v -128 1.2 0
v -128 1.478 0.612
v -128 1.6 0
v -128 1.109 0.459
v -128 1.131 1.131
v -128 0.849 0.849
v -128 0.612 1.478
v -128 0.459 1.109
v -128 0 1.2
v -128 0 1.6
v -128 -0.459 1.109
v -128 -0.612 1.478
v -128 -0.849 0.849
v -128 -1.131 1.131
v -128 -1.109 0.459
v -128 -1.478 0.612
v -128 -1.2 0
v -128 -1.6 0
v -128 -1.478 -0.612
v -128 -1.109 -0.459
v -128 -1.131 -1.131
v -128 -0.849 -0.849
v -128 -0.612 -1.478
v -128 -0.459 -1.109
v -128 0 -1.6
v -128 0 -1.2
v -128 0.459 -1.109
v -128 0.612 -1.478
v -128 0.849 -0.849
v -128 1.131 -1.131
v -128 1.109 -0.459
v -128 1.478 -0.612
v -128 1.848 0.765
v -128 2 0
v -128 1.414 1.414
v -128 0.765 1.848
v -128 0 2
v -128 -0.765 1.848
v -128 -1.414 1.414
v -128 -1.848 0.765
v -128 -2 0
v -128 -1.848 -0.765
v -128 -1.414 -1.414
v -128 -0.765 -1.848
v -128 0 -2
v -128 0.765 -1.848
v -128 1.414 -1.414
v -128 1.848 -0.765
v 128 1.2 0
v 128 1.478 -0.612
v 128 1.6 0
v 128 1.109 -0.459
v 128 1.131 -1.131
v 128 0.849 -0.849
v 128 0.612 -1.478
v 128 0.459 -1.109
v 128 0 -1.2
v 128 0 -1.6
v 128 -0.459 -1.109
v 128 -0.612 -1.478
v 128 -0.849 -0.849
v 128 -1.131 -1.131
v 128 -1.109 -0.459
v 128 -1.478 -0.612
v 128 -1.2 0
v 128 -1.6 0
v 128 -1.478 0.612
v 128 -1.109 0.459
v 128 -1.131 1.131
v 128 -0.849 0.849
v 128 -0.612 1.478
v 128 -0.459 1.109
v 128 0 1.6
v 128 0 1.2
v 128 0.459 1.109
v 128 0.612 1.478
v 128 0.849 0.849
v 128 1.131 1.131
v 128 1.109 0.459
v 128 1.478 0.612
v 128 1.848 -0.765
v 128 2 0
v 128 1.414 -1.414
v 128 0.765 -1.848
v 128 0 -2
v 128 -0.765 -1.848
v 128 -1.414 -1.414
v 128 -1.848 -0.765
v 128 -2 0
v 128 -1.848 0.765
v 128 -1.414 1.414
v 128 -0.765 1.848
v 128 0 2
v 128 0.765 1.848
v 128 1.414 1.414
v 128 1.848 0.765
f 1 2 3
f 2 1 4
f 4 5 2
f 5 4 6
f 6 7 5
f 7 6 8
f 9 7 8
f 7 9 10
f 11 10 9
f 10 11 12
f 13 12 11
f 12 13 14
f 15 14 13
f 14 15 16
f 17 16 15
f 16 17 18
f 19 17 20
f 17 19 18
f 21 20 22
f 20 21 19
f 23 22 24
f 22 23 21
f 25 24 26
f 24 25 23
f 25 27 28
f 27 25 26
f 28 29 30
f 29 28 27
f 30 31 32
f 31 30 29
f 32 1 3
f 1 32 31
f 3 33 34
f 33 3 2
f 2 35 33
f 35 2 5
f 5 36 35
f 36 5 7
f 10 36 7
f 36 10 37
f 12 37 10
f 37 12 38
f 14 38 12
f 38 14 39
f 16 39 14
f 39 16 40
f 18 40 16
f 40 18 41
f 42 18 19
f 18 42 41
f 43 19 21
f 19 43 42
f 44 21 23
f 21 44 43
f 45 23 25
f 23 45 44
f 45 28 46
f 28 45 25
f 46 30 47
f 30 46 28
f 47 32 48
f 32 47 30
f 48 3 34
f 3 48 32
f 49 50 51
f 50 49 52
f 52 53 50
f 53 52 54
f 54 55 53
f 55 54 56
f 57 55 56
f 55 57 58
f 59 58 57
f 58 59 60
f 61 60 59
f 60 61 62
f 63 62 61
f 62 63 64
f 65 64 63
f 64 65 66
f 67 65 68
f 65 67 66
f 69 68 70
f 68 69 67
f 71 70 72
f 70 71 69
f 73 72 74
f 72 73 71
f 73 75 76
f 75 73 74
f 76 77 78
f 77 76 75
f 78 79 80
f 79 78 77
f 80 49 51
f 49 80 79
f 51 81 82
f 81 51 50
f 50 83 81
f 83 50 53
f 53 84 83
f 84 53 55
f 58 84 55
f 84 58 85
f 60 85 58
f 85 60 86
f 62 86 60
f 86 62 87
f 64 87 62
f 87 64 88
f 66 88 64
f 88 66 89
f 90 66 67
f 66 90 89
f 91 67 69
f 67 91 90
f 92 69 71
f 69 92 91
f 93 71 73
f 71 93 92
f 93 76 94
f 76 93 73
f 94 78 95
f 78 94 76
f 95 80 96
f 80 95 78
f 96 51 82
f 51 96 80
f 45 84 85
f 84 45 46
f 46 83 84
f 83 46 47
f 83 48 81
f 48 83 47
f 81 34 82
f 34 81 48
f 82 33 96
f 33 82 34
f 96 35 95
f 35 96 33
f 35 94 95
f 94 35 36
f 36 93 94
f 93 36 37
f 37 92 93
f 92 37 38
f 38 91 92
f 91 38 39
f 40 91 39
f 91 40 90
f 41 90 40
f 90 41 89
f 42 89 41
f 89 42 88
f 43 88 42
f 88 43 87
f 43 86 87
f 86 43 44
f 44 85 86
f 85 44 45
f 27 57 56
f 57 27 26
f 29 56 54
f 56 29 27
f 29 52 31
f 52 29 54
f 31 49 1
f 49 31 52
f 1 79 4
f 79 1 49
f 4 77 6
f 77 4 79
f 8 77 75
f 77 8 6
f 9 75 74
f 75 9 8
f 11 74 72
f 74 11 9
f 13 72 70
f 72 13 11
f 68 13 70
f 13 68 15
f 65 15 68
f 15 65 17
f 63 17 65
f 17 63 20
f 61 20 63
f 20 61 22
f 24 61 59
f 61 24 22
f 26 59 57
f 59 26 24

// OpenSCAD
// file: ../p/4-4cyli.scad
use <../lib.scad>
function ldraw_lib__4_4cyli() = [
// 0 Cylinder 1.0
// 0 Name: 4-4cyli.dat
// 0 Author: James Jessiman
// 0 !LDRAW_ORG Primitive UPDATE 2005-01
// 0 !LICENSE Licensed under CC BY 2.0 and CC BY 4.0 : see CAreadme.txt
// 
// 0 BFC CERTIFY CCW
  [0,"BFC","CERTIFY"],
  [0,"BFC","CCW"],
// 
// 0 !HISTORY 1998-12-15 [PTadmin] Official Update 1998-10
// 0 !HISTORY 2002-03-23 [sbliss] Added BFC statement; merged headers from files in distributions LDraw 0.27 and Complete.
// 0 !HISTORY 2002-04-25 [PTadmin] Official Update 2002-02
// 0 !HISTORY 2004-12-14 [guyvivan] BFC CCW
// 0 !HISTORY 2005-12-28 [PTadmin] Official Update 2005-01
// 0 !HISTORY 2007-06-24 [PTadmin] Header formatted for Contributor Agreement
// 0 !HISTORY 2008-07-01 [PTadmin] Official Update 2008-01
// 
// 
// 4 16 1 1 0 0.9239 1 0.3827 0.9239 0 0.3827 1 0 0
  [4,16,1,1,0,0.9239,1,0.3827,0.9239,0,0.3827,1,0,0],
// 5 24 1 0 0 1 1 0 0.9239 0 0.3827 0.9239 0 -0.3827
  [5,24,1,0,0,1,1,0,0.9239,0,0.3827,0.9239,0,-0.3827],
// 4 16 0.9239 1 0.3827 0.7071 1 0.7071 0.7071 0 0.7071 0.9239 0 0.3827
  [4,16,0.9239,1,0.3827,0.7071,1,0.7071,0.7071,0,0.7071,0.9239,0,0.3827],
// 5 24 0.9239 0 0.3827 0.9239 1 0.3827 0.7071 0 0.7071 1 0 0
  [5,24,0.9239,0,0.3827,0.9239,1,0.3827,0.7071,0,0.7071,1,0,0],
// 4 16 0.7071 1 0.7071 0.3827 1 0.9239 0.3827 0 0.9239 0.7071 0 0.7071
  [4,16,0.7071,1,0.7071,0.3827,1,0.9239,0.3827,0,0.9239,0.7071,0,0.7071],
// 5 24 0.7071 0 0.7071 0.7071 1 0.7071 0.3827 0 0.9239 0.9239 0 0.3827
  [5,24,0.7071,0,0.7071,0.7071,1,0.7071,0.3827,0,0.9239,0.9239,0,0.3827],
// 4 16 0.3827 1 0.9239 0 1 1 0 0 1 0.3827 0 0.9239
  [4,16,0.3827,1,0.9239,0,1,1,0,0,1,0.3827,0,0.9239],
// 5 24 0.3827 0 0.9239 0.3827 1 0.9239 0 0 1 0.7071 0 0.7071
  [5,24,0.3827,0,0.9239,0.3827,1,0.9239,0,0,1,0.7071,0,0.7071],
// 4 16 0 1 1 -0.3827 1 0.9239 -0.3827 0 0.9239 0 0 1
  [4,16,0,1,1,-0.3827,1,0.9239,-0.3827,0,0.9239,0,0,1],
// 5 24 0 0 1 0 1 1 -0.3827 0 0.9239 0.3827 0 0.9239
  [5,24,0,0,1,0,1,1,-0.3827,0,0.9239,0.3827,0,0.9239],
// 4 16 -0.3827 1 0.9239 -0.7071 1 0.7071 -0.7071 0 0.7071 -0.3827 0 0.9239
  [4,16,-0.3827,1,0.9239,-0.7071,1,0.7071,-0.7071,0,0.7071,-0.3827,0,0.9239],
// 5 24 -0.3827 0 0.9239 -0.3827 1 0.9239 -0.7071 0 0.7071 0 0 1
  [5,24,-0.3827,0,0.9239,-0.3827,1,0.9239,-0.7071,0,0.7071,0,0,1],
// 4 16 -0.7071 1 0.7071 -0.9239 1 0.3827 -0.9239 0 0.3827 -0.7071 0 0.7071
  [4,16,-0.7071,1,0.7071,-0.9239,1,0.3827,-0.9239,0,0.3827,-0.7071,0,0.7071],
// 5 24 -0.7071 0 0.7071 -0.7071 1 0.7071 -0.9239 0 0.3827 -0.3827 0 0.9239
  [5,24,-0.7071,0,0.7071,-0.7071,1,0.7071,-0.9239,0,0.3827,-0.3827,0,0.9239],
// 4 16 -0.9239 1 0.3827 -1 1 0 -1 0 0 -0.9239 0 0.3827
  [4,16,-0.9239,1,0.3827,-1,1,0,-1,0,0,-0.9239,0,0.3827],
// 5 24 -0.9239 0 0.3827 -0.9239 1 0.3827 -1 0 0 -0.7071 0 0.7071
  [5,24,-0.9239,0,0.3827,-0.9239,1,0.3827,-1,0,0,-0.7071,0,0.7071],
// 4 16 -1 1 0 -0.9239 1 -0.3827 -0.9239 0 -0.3827 -1 0 0
  [4,16,-1,1,0,-0.9239,1,-0.3827,-0.9239,0,-0.3827,-1,0,0],
// 5 24 -1 0 0 -1 1 0 -0.9239 0 -0.3827 -0.9239 0 0.3827
  [5,24,-1,0,0,-1,1,0,-0.9239,0,-0.3827,-0.9239,0,0.3827],
// 4 16 -0.9239 1 -0.3827 -0.7071 1 -0.7071 -0.7071 0 -0.7071 -0.9239 0 -0.3827
  [4,16,-0.9239,1,-0.3827,-0.7071,1,-0.7071,-0.7071,0,-0.7071,-0.9239,0,-0.3827],
// 5 24 -0.9239 0 -0.3827 -0.9239 1 -0.3827 -0.7071 0 -0.7071 -1 0 0
  [5,24,-0.9239,0,-0.3827,-0.9239,1,-0.3827,-0.7071,0,-0.7071,-1,0,0],
// 4 16 -0.7071 1 -0.7071 -0.3827 1 -0.9239 -0.3827 0 -0.9239 -0.7071 0 -0.7071
  [4,16,-0.7071,1,-0.7071,-0.3827,1,-0.9239,-0.3827,0,-0.9239,-0.7071,0,-0.7071],
// 5 24 -0.7071 0 -0.7071 -0.7071 1 -0.7071 -0.3827 0 -0.9239 -0.9239 0 -0.3827
  [5,24,-0.7071,0,-0.7071,-0.7071,1,-0.7071,-0.3827,0,-0.9239,-0.9239,0,-0.3827],
// 4 16 -0.3827 1 -0.9239 0 1 -1 0 0 -1 -0.3827 0 -0.9239
  [4,16,-0.3827,1,-0.9239,0,1,-1,0,0,-1,-0.3827,0,-0.9239],
// 5 24 -0.3827 0 -0.9239 -0.3827 1 -0.9239 0 0 -1 -0.7071 0 -0.7071
  [5,24,-0.3827,0,-0.9239,-0.3827,1,-0.9239,0,0,-1,-0.7071,0,-0.7071],
// 4 16 0 1 -1 0.3827 1 -0.9239 0.3827 0 -0.9239 0 0 -1
  [4,16,0,1,-1,0.3827,1,-0.9239,0.3827,0,-0.9239,0,0,-1],
// 5 24 0 0 -1 0 1 -1 0.3827 0 -0.9239 -0.3827 0 -0.9239
  [5,24,0,0,-1,0,1,-1,0.3827,0,-0.9239,-0.3827,0,-0.9239],
// 4 16 0.3827 1 -0.9239 0.7071 1 -0.7071 0.7071 0 -0.7071 0.3827 0 -0.9239
  [4,16,0.3827,1,-0.9239,0.7071,1,-0.7071,0.7071,0,-0.7071,0.3827,0,-0.9239],
// 5 24 0.3827 0 -0.9239 0.3827 1 -0.9239 0.7071 0 -0.7071 0 0 -1
  [5,24,0.3827,0,-0.9239,0.3827,1,-0.9239,0.7071,0,-0.7071,0,0,-1],
// 4 16 0.7071 1 -0.7071 0.9239 1 -0.3827 0.9239 0 -0.3827 0.7071 0 -0.7071
  [4,16,0.7071,1,-0.7071,0.9239,1,-0.3827,0.9239,0,-0.3827,0.7071,0,-0.7071],
// 5 24 0.7071 0 -0.7071 0.7071 1 -0.7071 0.9239 0 -0.3827 0.3827 0 -0.9239
  [5,24,0.7071,0,-0.7071,0.7071,1,-0.7071,0.9239,0,-0.3827,0.3827,0,-0.9239],
// 4 16 0.9239 1 -0.3827 1 1 0 1 0 0 0.9239 0 -0.3827
  [4,16,0.9239,1,-0.3827,1,1,0,1,0,0,0.9239,0,-0.3827],
// 5 24 0.9239 0 -0.3827 0.9239 1 -0.3827 1 0 0 0.7071 0 -0.7071
  [5,24,0.9239,0,-0.3827,0.9239,1,-0.3827,1,0,0,0.7071,0,-0.7071],
// 0
];
module ldraw_lib__4_4cyli(step=0, col=false, unit=2/5, alt=false, line=0.2, solid=!$preview)
    makepoly(ldraw_lib__4_4cyli(), step=step, col=col, unit=unit, alt=alt, line=line, solid=solid);
ldraw_lib__4_4cyli(line=0.2);
// file: ../p/4-4ring4.scad
use <../lib.scad>
function ldraw_lib__4_4ring4() = [
// 0 Ring  4 x 1.0
// 0 Name: 4-4ring4.dat
// 0 Author: James Jessiman
// 0 !LDRAW_ORG Primitive UPDATE 2009-01
// 0 !LICENSE Licensed under CC BY 2.0 and CC BY 4.0 : see CAreadme.txt
// 
// 0 BFC CERTIFY CCW
  [0,"BFC","CERTIFY"],
  [0,"BFC","CCW"],
// 
// 0 !HISTORY 1998-12-15 [PTadmin] Official Update 1998-10
// 0 !HISTORY 2002-04-08 [BrickCaster] Modified for BFC compliance
// 0 !HISTORY 2002-04-25 [PTadmin] Official Update 2002-02
// 0 !HISTORY 2007-06-24 [PTadmin] Header formatted for Contributor Agreement
// 0 !HISTORY 2008-07-01 [PTadmin] Official Update 2008-01
// 0 !HISTORY 2008-08-26 [cwdee] Switch polygon winding and rename
// 0 !HISTORY 2009-05-02 [PTadmin] Official Update 2009-01
// 
// 
// 4 16 -1.9135 0 4.6195 -1.5308 0 3.6956 0 0 4 0 0 5
  [4,16,-1.9135,0,4.6195,-1.5308,0,3.6956,0,0,4,0,0,5],
// 4 16 -3.5355 0 3.5355 -2.8284 0 2.8284 -1.5308 0 3.6956 -1.9135 0 4.6195
  [4,16,-3.5355,0,3.5355,-2.8284,0,2.8284,-1.5308,0,3.6956,-1.9135,0,4.6195],
// 4 16 -4.6195 0 1.9135 -3.6956 0 1.5308 -2.8284 0 2.8284 -3.5355 0 3.5355
  [4,16,-4.6195,0,1.9135,-3.6956,0,1.5308,-2.8284,0,2.8284,-3.5355,0,3.5355],
// 4 16 -5 0 0 -4 0 0 -3.6956 0 1.5308 -4.6195 0 1.9135
  [4,16,-5,0,0,-4,0,0,-3.6956,0,1.5308,-4.6195,0,1.9135],
// 4 16 -4.6195 0 -1.9135 -3.6956 0 -1.5308 -4 0 0 -5 0 0
  [4,16,-4.6195,0,-1.9135,-3.6956,0,-1.5308,-4,0,0,-5,0,0],
// 4 16 -3.5355 0 -3.5355 -2.8284 0 -2.8284 -3.6956 0 -1.5308 -4.6195 0 -1.9135
  [4,16,-3.5355,0,-3.5355,-2.8284,0,-2.8284,-3.6956,0,-1.5308,-4.6195,0,-1.9135],
// 4 16 -1.9135 0 -4.6195 -1.5308 0 -3.6956 -2.8284 0 -2.8284 -3.5355 0 -3.5355
  [4,16,-1.9135,0,-4.6195,-1.5308,0,-3.6956,-2.8284,0,-2.8284,-3.5355,0,-3.5355],
// 4 16 0 0 -5 0 0 -4 -1.5308 0 -3.6956 -1.9135 0 -4.6195
  [4,16,0,0,-5,0,0,-4,-1.5308,0,-3.6956,-1.9135,0,-4.6195],
// 4 16 1.9135 0 -4.6195 1.5308 0 -3.6956 0 0 -4 0 0 -5
  [4,16,1.9135,0,-4.6195,1.5308,0,-3.6956,0,0,-4,0,0,-5],
// 4 16 3.5355 0 -3.5355 2.8284 0 -2.8284 1.5308 0 -3.6956 1.9135 0 -4.6195
  [4,16,3.5355,0,-3.5355,2.8284,0,-2.8284,1.5308,0,-3.6956,1.9135,0,-4.6195],
// 4 16 4.6195 0 -1.9135 3.6956 0 -1.5308 2.8284 0 -2.8284 3.5355 0 -3.5355
  [4,16,4.6195,0,-1.9135,3.6956,0,-1.5308,2.8284,0,-2.8284,3.5355,0,-3.5355],
// 4 16 5 0 0 4 0 0 3.6956 0 -1.5308 4.6195 0 -1.9135
  [4,16,5,0,0,4,0,0,3.6956,0,-1.5308,4.6195,0,-1.9135],
// 4 16 4.6195 0 1.9135 3.6956 0 1.5308 4 0 0 5 0 0
  [4,16,4.6195,0,1.9135,3.6956,0,1.5308,4,0,0,5,0,0],
// 4 16 3.5355 0 3.5355 2.8284 0 2.8284 3.6956 0 1.5308 4.6195 0 1.9135
  [4,16,3.5355,0,3.5355,2.8284,0,2.8284,3.6956,0,1.5308,4.6195,0,1.9135],
// 4 16 1.9135 0 4.6195 1.5308 0 3.6956 2.8284 0 2.8284 3.5355 0 3.5355
  [4,16,1.9135,0,4.6195,1.5308,0,3.6956,2.8284,0,2.8284,3.5355,0,3.5355],
// 4 16 0 0 5 0 0 4 1.5308 0 3.6956 1.9135 0 4.6195
  [4,16,0,0,5,0,0,4,1.5308,0,3.6956,1.9135,0,4.6195],
// 0
];
module ldraw_lib__4_4ring4(step=0, col=false, unit=2/5, alt=false, line=0.2, solid=!$preview)
    makepoly(ldraw_lib__4_4ring4(), step=step, col=col, unit=unit, alt=alt, line=line, solid=solid);
ldraw_lib__4_4ring4(line=0.2);
// file: ../p/4-4ring3.scad
use <../lib.scad>
function ldraw_lib__4_4ring3() = [
// 0 Ring  3 x 1.0
// 0 Name: 4-4ring3.dat
// 0 Author: James Jessiman
// 0 !LDRAW_ORG Primitive UPDATE 2009-01
// 0 !LICENSE Licensed under CC BY 2.0 and CC BY 4.0 : see CAreadme.txt
// 
// 0 BFC CERTIFY CCW
  [0,"BFC","CERTIFY"],
  [0,"BFC","CCW"],
// 
// 0 !HISTORY 1998-12-15 [PTadmin] Official Update 1998-10
// 0 !HISTORY 2002-04-05 [hafhead] Added BFC statement
// 0 !HISTORY 2002-04-25 [PTadmin] Official Update 2002-02
// 0 !HISTORY 2007-06-24 [PTadmin] Header formatted for Contributor Agreement
// 0 !HISTORY 2008-07-01 [PTadmin] Official Update 2008-01
// 0 !HISTORY 2008-08-26 [cwdee] Switch polygon winding and rename
// 0 !HISTORY 2009-05-02 [PTadmin] Official Update 2009-01
// 
// 
// 4 16 -1.5308 0 3.6956 -1.1481 0 2.7717 0 0 3 0 0 4
  [4,16,-1.5308,0,3.6956,-1.1481,0,2.7717,0,0,3,0,0,4],
// 4 16 -2.8284 0 2.8284 -2.1213 0 2.1213 -1.1481 0 2.7717 -1.5308 0 3.6956
  [4,16,-2.8284,0,2.8284,-2.1213,0,2.1213,-1.1481,0,2.7717,-1.5308,0,3.6956],
// 4 16 -3.6956 0 1.5308 -2.7717 0 1.1481 -2.1213 0 2.1213 -2.8284 0 2.8284
  [4,16,-3.6956,0,1.5308,-2.7717,0,1.1481,-2.1213,0,2.1213,-2.8284,0,2.8284],
// 4 16 -4 0 0 -3 0 0 -2.7717 0 1.1481 -3.6956 0 1.5308
  [4,16,-4,0,0,-3,0,0,-2.7717,0,1.1481,-3.6956,0,1.5308],
// 4 16 -3.6956 0 -1.5308 -2.7717 0 -1.1481 -3 0 0 -4 0 0
  [4,16,-3.6956,0,-1.5308,-2.7717,0,-1.1481,-3,0,0,-4,0,0],
// 4 16 -2.8284 0 -2.8284 -2.1213 0 -2.1213 -2.7717 0 -1.1481 -3.6956 0 -1.5308
  [4,16,-2.8284,0,-2.8284,-2.1213,0,-2.1213,-2.7717,0,-1.1481,-3.6956,0,-1.5308],
// 4 16 -1.5308 0 -3.6956 -1.1481 0 -2.7717 -2.1213 0 -2.1213 -2.8284 0 -2.8284
  [4,16,-1.5308,0,-3.6956,-1.1481,0,-2.7717,-2.1213,0,-2.1213,-2.8284,0,-2.8284],
// 4 16 0 0 -4 0 0 -3 -1.1481 0 -2.7717 -1.5308 0 -3.6956
  [4,16,0,0,-4,0,0,-3,-1.1481,0,-2.7717,-1.5308,0,-3.6956],
// 4 16 1.5308 0 -3.6956 1.1481 0 -2.7717 0 0 -3 0 0 -4
  [4,16,1.5308,0,-3.6956,1.1481,0,-2.7717,0,0,-3,0,0,-4],
// 4 16 2.8284 0 -2.8284 2.1213 0 -2.1213 1.1481 0 -2.7717 1.5308 0 -3.6956
  [4,16,2.8284,0,-2.8284,2.1213,0,-2.1213,1.1481,0,-2.7717,1.5308,0,-3.6956],
// 4 16 3.6956 0 -1.5308 2.7717 0 -1.1481 2.1213 0 -2.1213 2.8284 0 -2.8284
  [4,16,3.6956,0,-1.5308,2.7717,0,-1.1481,2.1213,0,-2.1213,2.8284,0,-2.8284],
// 4 16 4 0 0 3 0 0 2.7717 0 -1.1481 3.6956 0 -1.5308
  [4,16,4,0,0,3,0,0,2.7717,0,-1.1481,3.6956,0,-1.5308],
// 4 16 3.6956 0 1.5308 2.7717 0 1.1481 3 0 0 4 0 0
  [4,16,3.6956,0,1.5308,2.7717,0,1.1481,3,0,0,4,0,0],
// 4 16 2.8284 0 2.8284 2.1213 0 2.1213 2.7717 0 1.1481 3.6956 0 1.5308
  [4,16,2.8284,0,2.8284,2.1213,0,2.1213,2.7717,0,1.1481,3.6956,0,1.5308],
// 4 16 1.5308 0 3.6956 1.1481 0 2.7717 2.1213 0 2.1213 2.8284 0 2.8284
  [4,16,1.5308,0,3.6956,1.1481,0,2.7717,2.1213,0,2.1213,2.8284,0,2.8284],
// 4 16 0 0 4 0 0 3 1.1481 0 2.7717 1.5308 0 3.6956
  [4,16,0,0,4,0,0,3,1.1481,0,2.7717,1.5308,0,3.6956],
// 0
];
module ldraw_lib__4_4ring3(step=0, col=false, unit=2/5, alt=false, line=0.2, solid=!$preview)
    makepoly(ldraw_lib__4_4ring3(), step=step, col=col, unit=unit, alt=alt, line=line, solid=solid);
ldraw_lib__4_4ring3(line=0.2);
// file: ../p/4-4edge.scad
use <../lib.scad>
function ldraw_lib__4_4edge() = [
// 0 Circle 1.0
// 0 Name: 4-4edge.dat
// 0 Author: James Jessiman
// 0 !LDRAW_ORG Primitive UPDATE 2017-01
// 0 !LICENSE Licensed under CC BY 2.0 and CC BY 4.0 : see CAreadme.txt
// 
// 0 BFC CERTIFY CCW
  [0,"BFC","CERTIFY"],
  [0,"BFC","CCW"],
// 
// 0 !HISTORY 1998-12-15 [PTadmin] Official Update 1998-10
// 0 !HISTORY 2005-12-28 [PTadmin] Official Update 2005-01
// 0 !HISTORY 2007-06-24 [PTadmin] Header formatted for Contributor Agreement
// 0 !HISTORY 2008-07-01 [PTadmin] Official Update 2008-01
// 0 !HISTORY 2017-01-15 [Steffen] BFCed
// 0 !HISTORY 2017-12-30 [PTadmin] Official Update 2017-01
// 
// 
// 2 24 1 0 0 0.9239 0 0.3827
  [2,24,1,0,0,0.9239,0,0.3827],
// 2 24 0.9239 0 0.3827 0.7071 0 0.7071
  [2,24,0.9239,0,0.3827,0.7071,0,0.7071],
// 2 24 0.7071 0 0.7071 0.3827 0 0.9239
  [2,24,0.7071,0,0.7071,0.3827,0,0.9239],
// 2 24 0.3827 0 0.9239 0 0 1
  [2,24,0.3827,0,0.9239,0,0,1],
// 2 24 0 0 1 -0.3827 0 0.9239
  [2,24,0,0,1,-0.3827,0,0.9239],
// 2 24 -0.3827 0 0.9239 -0.7071 0 0.7071
  [2,24,-0.3827,0,0.9239,-0.7071,0,0.7071],
// 2 24 -0.7071 0 0.7071 -0.9239 0 0.3827
  [2,24,-0.7071,0,0.7071,-0.9239,0,0.3827],
// 2 24 -0.9239 0 0.3827 -1 0 -0
  [2,24,-0.9239,0,0.3827,-1,0,-0],
// 2 24 -1 0 -0 -0.9239 0 -0.3827
  [2,24,-1,0,-0,-0.9239,0,-0.3827],
// 2 24 -0.9239 0 -0.3827 -0.7071 0 -0.7071
  [2,24,-0.9239,0,-0.3827,-0.7071,0,-0.7071],
// 2 24 -0.7071 0 -0.7071 -0.3827 0 -0.9239
  [2,24,-0.7071,0,-0.7071,-0.3827,0,-0.9239],
// 2 24 -0.3827 0 -0.9239 0 0 -1
  [2,24,-0.3827,0,-0.9239,0,0,-1],
// 2 24 0 0 -1 0.3827 0 -0.9239
  [2,24,0,0,-1,0.3827,0,-0.9239],
// 2 24 0.3827 0 -0.9239 0.7071 0 -0.7071
  [2,24,0.3827,0,-0.9239,0.7071,0,-0.7071],
// 2 24 0.7071 0 -0.7071 0.9239 0 -0.3827
  [2,24,0.7071,0,-0.7071,0.9239,0,-0.3827],
// 2 24 0.9239 0 -0.3827 1 0 0
  [2,24,0.9239,0,-0.3827,1,0,0],
];
module ldraw_lib__4_4edge(step=0, col=false, unit=2/5, alt=false, line=0.2, solid=!$preview)
    makepoly(ldraw_lib__4_4edge(), step=step, col=col, unit=unit, alt=alt, line=line, solid=solid);
ldraw_lib__4_4edge(line=0.2);
// file: 71533k03.scad
use <../lib.scad>
use <../p/4-4cyli.scad>
function ldraw_lib__71533k03() = [
// 0 ~Technic Pneumatic Tube Segment
// 0 Name: 71533k03.dat
// 0 Author: Jaco van der Molen [Jaco]
// 0 !LDRAW_ORG Part Flexible_Section UPDATE 2020-01
// 0 !LICENSE Licensed under CC BY 2.0 and CC BY 4.0 : see CAreadme.txt
// 
// 0 BFC CERTIFY CW
  [0,"BFC","CERTIFY"],
  [0,"BFC","CW"],
// 
// 0 !HISTORY 2003-11-30 [Steffen] BFCed
// 0 !HISTORY 2009-12-29 [PTadmin] Official Update 2009-03
// 0 !HISTORY 2020-06-27 [PTadmin] Renamed from 166
// 0 !HISTORY 2020-06-28 [PTadmin] Official Update 2020-01
// 
// 
// 1 16 0 0 0 5 0 0 0 1 0 0 0 5 4-4cyli.dat
  [1,16,0,0,0,5,0,0,0,1,0,0,0,5, ldraw_lib__4_4cyli()],
// 0 BFC INVERTNEXT
  [0,"BFC","INVERTNEXT"],
// 1 16 0 0 0 3 0 0 0 1 0 0 0 3 4-4cyli.dat
  [1,16,0,0,0,3,0,0,0,1,0,0,0,3, ldraw_lib__4_4cyli()],
// 0
];
module ldraw_lib__71533k03(step=0, col=false, unit=2/5, alt=false, line=0.2, solid=!$preview)
    makepoly(ldraw_lib__71533k03(), step=step, col=col, unit=unit, alt=alt, line=line, solid=solid);
ldraw_lib__71533k03(line=0.2);
// file: 71533k02.scad
use <../lib.scad>
use <../p/4-4edge.scad>
use <../p/4-4ring3.scad>
use <../p/4-4ring4.scad>
function ldraw_lib__71533k02() = [
// 0 ~Technic Pneumatic Tube End (Non-Bulged)
// 0 Name: 71533k02.dat
// 0 Author: Steffen [Steffen]
// 0 !LDRAW_ORG Part Flexible_Section UPDATE 2020-01
// 0 !LICENSE Licensed under CC BY 2.0 and CC BY 4.0 : see CAreadme.txt
// 
// 0 BFC CERTIFY CCW
  [0,"BFC","CERTIFY"],
  [0,"BFC","CCW"],
// 
// 0 !HISTORY 2020-06-28 [PTadmin] Official Update 2020-01
// 
// 
// 0 // This file goes together with 71533k01.dat and 71533k03.dat.
// 0 // Those 3 files can be used to create Technic Pneumatic Tubes
// 0 // with either bulged or non-bulged ends.
// 
// 1 16 0 0 0 1 0 0 0 1 0 0 0 1 4-4ring3.dat
  [1,16,0,0,0,1,0,0,0,1,0,0,0,1, ldraw_lib__4_4ring3()],
// 1 16 0 0 0 1 0 0 0 1 0 0 0 1 4-4ring4.dat
  [1,16,0,0,0,1,0,0,0,1,0,0,0,1, ldraw_lib__4_4ring4()],
// 1 16 0 0 0 3 0 0 0 3 0 0 0 3 4-4edge.dat
  [1,16,0,0,0,3,0,0,0,3,0,0,0,3, ldraw_lib__4_4edge()],
// 1 16 0 0 0 5 0 0 0 5 0 0 0 5 4-4edge.dat
  [1,16,0,0,0,5,0,0,0,5,0,0,0,5, ldraw_lib__4_4edge()],
];
module ldraw_lib__71533k02(step=0, col=false, unit=2/5, alt=false, line=0.2, solid=!$preview)
    makepoly(ldraw_lib__71533k02(), step=step, col=col, unit=unit, alt=alt, line=line, solid=solid);
ldraw_lib__71533k02(line=0.2);
// main file
use <../lib.scad>
use <71533k02.scad>
use <71533k03.scad>
function ldraw_lib__26440_f1() = [
// 0 Technic Pneumatic Tube 32L
// 0 Name: 26440-f1.dat
// 0 Author: Philippe Hurbain [Philo]
// 0 !LDRAW_ORG Part UPDATE 2020-02
// 0 !LICENSE Licensed under CC BY 2.0 and CC BY 4.0 : see CAreadme.txt
// 
// 0 BFC CERTIFY CCW
  [0,"BFC","CERTIFY"],
  [0,"BFC","CCW"],
// 
// 0 !KEYWORDS 256 mm
// 
// 0 !HISTORY 2020-09-05 [PTadmin] Official Update 2020-02
// 
// 
// 1 16 -320 0 0 0 1 0 1 0 0 0 0 1 71533k02.dat
  [1,16,-320,0,0,0,1,0,1,0,0,0,0,1, ldraw_lib__71533k02()],
// 1 16 320 0 0 0 -1 0 -1 0 0 0 0 1 71533k02.dat
  [1,16,320,0,0,0,-1,0,-1,0,0,0,0,1, ldraw_lib__71533k02()],
// 1 16 -320 0 0 0 640 0 1 0 0 0 0 1 71533k03.dat
  [1,16,-320,0,0,0,640,0,1,0,0,0,0,1, ldraw_lib__71533k03()],
];
module ldraw_lib__26440_f1(step=0, col=false, unit=2/5, alt=false, line=0.2, solid=!$preview)
    makepoly(ldraw_lib__26440_f1(), step=step, col=col, unit=unit, alt=alt, line=line, solid=solid);
ldraw_lib__26440_f1(line=0.2);
